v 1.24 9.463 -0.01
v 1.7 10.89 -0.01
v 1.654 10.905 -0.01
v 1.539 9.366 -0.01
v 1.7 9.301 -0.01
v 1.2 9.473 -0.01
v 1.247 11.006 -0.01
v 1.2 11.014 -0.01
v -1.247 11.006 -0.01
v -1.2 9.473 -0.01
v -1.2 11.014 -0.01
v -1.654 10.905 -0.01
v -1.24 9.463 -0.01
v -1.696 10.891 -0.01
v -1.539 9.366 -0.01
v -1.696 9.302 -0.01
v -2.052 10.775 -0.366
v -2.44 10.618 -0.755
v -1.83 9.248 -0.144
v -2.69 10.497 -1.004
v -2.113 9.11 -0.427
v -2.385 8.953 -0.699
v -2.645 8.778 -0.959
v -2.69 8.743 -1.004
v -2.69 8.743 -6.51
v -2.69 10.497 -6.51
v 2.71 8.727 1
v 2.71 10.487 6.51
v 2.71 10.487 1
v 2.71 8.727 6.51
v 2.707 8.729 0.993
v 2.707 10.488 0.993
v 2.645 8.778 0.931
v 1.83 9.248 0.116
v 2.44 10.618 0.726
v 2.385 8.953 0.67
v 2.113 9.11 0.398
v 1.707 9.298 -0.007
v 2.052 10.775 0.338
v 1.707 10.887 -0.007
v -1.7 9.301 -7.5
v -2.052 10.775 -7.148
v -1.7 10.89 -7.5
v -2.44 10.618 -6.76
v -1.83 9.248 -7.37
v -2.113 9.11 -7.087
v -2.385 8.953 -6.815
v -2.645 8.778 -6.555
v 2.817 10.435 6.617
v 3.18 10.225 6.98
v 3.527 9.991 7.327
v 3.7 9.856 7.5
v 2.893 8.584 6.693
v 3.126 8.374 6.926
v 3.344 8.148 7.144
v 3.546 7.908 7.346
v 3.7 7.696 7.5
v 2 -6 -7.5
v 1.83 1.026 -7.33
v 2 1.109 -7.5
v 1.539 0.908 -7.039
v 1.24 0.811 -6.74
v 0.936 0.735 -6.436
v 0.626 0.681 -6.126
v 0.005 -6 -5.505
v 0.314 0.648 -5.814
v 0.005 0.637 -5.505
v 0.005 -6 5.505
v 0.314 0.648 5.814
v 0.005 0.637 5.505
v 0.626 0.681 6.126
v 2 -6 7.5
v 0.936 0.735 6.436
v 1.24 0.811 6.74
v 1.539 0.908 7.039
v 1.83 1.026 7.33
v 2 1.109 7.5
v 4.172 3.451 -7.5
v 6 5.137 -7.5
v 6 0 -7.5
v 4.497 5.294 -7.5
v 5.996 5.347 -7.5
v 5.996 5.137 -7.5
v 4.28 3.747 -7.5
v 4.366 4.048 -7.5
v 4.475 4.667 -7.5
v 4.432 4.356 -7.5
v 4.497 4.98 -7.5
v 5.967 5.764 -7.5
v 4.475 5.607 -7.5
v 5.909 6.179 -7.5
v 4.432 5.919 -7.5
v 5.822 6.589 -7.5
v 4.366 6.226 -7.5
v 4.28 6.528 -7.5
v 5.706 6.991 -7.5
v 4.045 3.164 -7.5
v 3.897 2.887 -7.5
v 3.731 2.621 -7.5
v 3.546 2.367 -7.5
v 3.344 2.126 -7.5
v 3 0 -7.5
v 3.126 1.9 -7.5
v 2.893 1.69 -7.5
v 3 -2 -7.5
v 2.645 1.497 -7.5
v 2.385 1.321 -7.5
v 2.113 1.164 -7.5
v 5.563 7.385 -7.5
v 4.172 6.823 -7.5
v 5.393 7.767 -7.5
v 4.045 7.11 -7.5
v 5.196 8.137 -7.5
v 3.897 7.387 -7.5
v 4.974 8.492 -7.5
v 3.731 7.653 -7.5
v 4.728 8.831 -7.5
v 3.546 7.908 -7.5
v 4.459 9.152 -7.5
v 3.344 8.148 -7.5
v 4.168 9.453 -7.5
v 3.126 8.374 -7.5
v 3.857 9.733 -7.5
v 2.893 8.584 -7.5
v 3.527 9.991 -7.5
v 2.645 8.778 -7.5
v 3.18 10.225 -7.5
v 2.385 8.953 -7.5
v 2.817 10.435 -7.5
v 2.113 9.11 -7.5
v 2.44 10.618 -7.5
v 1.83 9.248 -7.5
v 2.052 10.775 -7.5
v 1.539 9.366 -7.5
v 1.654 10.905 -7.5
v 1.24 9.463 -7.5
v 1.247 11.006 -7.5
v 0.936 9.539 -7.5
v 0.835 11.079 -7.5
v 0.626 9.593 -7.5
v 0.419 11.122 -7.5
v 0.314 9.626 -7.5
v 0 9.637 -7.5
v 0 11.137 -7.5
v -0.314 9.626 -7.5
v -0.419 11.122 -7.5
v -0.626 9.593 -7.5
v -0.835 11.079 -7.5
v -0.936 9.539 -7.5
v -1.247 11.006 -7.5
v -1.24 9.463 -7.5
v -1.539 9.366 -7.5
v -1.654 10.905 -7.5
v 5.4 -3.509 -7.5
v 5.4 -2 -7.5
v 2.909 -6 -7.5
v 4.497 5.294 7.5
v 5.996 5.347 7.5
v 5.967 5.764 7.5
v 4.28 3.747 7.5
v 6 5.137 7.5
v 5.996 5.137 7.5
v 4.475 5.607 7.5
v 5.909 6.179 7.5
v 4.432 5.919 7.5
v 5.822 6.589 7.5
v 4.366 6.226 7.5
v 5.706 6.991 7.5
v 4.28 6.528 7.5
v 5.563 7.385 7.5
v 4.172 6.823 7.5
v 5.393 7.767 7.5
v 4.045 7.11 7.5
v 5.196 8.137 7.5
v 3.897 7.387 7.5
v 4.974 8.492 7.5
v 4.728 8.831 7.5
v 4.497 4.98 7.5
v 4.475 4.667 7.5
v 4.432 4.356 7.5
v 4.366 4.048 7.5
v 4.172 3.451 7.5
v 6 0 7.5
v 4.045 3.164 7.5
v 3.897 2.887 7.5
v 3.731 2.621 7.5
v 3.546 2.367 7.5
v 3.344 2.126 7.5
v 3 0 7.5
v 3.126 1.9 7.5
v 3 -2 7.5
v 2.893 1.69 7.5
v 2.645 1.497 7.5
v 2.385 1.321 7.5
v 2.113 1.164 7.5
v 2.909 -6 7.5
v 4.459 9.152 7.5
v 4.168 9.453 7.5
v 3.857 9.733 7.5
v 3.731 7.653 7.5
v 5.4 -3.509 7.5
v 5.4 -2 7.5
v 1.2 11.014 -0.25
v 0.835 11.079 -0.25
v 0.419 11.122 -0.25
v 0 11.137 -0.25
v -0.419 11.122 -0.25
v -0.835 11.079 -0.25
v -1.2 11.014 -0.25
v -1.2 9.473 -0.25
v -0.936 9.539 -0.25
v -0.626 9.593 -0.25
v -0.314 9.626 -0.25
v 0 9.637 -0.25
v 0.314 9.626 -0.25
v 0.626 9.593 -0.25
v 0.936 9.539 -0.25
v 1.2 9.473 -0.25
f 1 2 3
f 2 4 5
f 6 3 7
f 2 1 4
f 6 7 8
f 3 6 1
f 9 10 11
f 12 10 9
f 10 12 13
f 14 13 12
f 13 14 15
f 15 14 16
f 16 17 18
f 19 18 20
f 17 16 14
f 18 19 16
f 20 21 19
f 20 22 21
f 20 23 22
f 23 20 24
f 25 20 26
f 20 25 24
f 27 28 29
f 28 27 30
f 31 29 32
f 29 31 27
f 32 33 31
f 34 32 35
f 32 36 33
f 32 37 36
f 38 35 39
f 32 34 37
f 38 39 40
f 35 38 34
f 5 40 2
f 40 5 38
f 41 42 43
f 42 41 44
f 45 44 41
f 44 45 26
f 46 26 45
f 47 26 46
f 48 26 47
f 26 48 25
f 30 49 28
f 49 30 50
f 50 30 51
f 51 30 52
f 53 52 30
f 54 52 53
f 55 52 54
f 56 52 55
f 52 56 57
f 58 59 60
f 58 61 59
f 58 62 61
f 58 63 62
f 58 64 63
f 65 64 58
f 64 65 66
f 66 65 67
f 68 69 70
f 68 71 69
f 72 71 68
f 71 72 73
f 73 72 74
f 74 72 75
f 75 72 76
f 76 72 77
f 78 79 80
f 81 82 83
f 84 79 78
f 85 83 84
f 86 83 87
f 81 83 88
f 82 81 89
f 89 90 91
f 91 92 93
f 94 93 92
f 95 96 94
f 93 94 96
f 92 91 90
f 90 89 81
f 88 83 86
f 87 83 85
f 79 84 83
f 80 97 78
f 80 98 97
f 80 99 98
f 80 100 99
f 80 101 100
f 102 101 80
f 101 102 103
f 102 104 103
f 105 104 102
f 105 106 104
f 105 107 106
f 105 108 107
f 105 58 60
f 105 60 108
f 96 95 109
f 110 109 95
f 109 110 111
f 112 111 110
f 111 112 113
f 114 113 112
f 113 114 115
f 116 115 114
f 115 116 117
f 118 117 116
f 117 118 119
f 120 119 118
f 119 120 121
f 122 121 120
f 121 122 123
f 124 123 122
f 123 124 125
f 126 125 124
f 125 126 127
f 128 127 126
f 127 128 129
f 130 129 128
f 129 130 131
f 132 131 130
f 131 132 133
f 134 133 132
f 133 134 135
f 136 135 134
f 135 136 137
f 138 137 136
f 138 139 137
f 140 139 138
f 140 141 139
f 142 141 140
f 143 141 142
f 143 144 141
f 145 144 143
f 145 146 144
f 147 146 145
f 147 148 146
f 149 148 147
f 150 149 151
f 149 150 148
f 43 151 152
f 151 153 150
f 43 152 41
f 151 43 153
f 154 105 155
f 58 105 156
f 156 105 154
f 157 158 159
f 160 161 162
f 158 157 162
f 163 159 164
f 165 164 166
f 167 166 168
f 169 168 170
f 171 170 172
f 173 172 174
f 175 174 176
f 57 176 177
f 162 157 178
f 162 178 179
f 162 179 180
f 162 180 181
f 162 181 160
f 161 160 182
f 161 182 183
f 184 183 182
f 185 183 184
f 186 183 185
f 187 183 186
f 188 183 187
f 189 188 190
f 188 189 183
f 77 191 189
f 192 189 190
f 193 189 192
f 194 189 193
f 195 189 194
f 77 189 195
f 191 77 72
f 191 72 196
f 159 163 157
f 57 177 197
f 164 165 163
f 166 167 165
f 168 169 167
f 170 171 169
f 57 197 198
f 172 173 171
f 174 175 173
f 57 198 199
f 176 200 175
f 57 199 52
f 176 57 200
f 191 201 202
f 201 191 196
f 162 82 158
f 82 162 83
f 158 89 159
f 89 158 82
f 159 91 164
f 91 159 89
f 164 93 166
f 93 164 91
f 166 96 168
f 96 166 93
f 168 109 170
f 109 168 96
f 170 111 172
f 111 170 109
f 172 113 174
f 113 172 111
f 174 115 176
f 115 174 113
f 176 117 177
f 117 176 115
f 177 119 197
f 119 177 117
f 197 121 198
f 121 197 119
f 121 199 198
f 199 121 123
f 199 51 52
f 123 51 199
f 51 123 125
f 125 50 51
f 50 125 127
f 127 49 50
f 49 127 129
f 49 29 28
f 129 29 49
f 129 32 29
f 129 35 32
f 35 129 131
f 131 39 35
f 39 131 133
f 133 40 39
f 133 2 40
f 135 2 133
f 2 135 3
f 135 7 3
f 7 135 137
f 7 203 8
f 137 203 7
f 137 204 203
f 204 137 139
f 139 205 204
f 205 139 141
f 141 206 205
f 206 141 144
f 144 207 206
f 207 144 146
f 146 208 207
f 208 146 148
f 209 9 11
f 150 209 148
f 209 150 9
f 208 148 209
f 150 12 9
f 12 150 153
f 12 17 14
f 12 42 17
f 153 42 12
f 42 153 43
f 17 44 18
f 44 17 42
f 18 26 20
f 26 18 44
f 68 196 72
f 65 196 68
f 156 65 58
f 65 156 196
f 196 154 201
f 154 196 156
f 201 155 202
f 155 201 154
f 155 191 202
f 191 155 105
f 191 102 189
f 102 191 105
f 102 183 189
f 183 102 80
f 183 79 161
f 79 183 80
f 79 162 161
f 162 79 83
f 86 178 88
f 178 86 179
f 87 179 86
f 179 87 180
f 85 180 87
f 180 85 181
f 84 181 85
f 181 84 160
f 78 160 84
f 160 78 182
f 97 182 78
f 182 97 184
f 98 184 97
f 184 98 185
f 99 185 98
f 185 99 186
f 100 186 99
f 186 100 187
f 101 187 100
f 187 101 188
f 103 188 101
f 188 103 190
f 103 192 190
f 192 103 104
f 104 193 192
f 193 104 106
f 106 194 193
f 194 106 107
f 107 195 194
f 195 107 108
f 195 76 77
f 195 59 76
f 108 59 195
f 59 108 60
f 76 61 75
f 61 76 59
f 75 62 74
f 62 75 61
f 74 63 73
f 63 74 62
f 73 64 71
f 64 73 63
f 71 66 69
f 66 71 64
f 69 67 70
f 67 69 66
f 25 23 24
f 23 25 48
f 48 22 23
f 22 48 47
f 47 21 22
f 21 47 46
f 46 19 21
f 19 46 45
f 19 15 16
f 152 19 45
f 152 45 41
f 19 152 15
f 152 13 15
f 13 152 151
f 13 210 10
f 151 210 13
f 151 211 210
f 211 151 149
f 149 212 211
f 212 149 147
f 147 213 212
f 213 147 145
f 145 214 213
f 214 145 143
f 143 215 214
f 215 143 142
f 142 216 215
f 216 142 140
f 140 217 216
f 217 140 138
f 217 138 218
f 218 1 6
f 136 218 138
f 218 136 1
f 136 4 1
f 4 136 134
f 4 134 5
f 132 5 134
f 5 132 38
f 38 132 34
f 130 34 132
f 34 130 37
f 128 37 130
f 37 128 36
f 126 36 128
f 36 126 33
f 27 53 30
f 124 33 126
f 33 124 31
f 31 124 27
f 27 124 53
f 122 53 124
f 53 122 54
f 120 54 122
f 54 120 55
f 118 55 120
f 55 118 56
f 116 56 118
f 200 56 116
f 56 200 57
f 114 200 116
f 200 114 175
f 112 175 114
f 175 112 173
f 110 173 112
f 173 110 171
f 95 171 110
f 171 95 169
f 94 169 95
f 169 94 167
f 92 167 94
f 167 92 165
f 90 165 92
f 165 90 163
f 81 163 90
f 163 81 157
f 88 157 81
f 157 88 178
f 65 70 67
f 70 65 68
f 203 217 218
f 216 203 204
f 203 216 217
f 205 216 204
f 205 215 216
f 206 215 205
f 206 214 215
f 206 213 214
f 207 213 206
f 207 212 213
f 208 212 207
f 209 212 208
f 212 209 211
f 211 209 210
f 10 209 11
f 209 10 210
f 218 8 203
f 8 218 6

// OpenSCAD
// OB-2020 T-Slot Cable Holder
// v1, 26/3/2019
// by inks007
// Modified for 2020 profile by frol, 2019-04-05
// This work is licensed under a Creative Commons Attribution-NonCommercial-ShareAlike 4.0 International License
// (CC BY-NC-SA 4.0)

// Cable holder length
holder_ln = 15;
// Cable holder inner diameter (range = 5-36)
holder_id = 9; // [5:36]
// Cable holder thickness (range = 2-4)
holder_th = 1.5; // [0.5:0.25:4]
// Loosen fit (range = 0-0.3)
loosen = 0.1; // [0:0.05:0.31]

/* [Profile Sizes] */

profile_slot_width=6.2;
profile_slot_depth=6.1;
profile_cage_width=11;
profile_cage_corner_cut=2.55;
profile_wall_thickness=1.9;

/* [Hidden] */

holder_hln = holder_ln/2;
holder_ir = holder_id/2;
holder_od = holder_id+holder_th*2;
holder_or = holder_ir+holder_th;
holder_os = sqrt(pow(holder_ir+holder_th,2)-pow(profile_slot_width/2,2))-holder_ir;
cut_os = 0.6*holder_ir;
cut_points = [[0,0],[0,cut_os-1],[1,cut_os],[holder_hln+0.1,cut_os]];

rotate([-90,90,0]) holder();

module holder() {
	difference() {
		rotate([0,-90,0]) linear_extrude(holder_ln,convexity=3,center=true) difference() {
			union() {
				offset(delta=-loosen) flange_profile();
				intersection() {
					translate([holder_ir+holder_os,0]) circle(d=holder_od,$fn=90);
					translate([holder_id+holder_os,0]) square(holder_od+2,center=true);
				}
				translate([holder_ir/2+holder_os/2,0]) square([holder_ir+holder_os,holder_od],center=true);
			}
			translate([holder_ir+holder_os,0]) circle(d=holder_id,$fn=90);
		}
		// Base cut
		translate([0,0,-10]) linear_extrude(10.1+holder_os+holder_ir,convexity=2) square([holder_ln+2,0.01],center=true);
		// Z cut
		rotate_duplicate([0,0,1]) translate([0,0,holder_os+holder_ir]) linear_extrude(holder_or+1,convexity=2) for (p=[0:1:len(cut_points)-2]) hull() {
			translate(cut_points[p]) circle(r=0.01,$fn=8);
			translate(cut_points[p+1]) circle(r=0.01,$fn=8);
		}
		// Screwdriver slot
		translate([0,0,holder_os+holder_ir+holder_or/2+0.5]) cube([0.5,cut_os*2-3,holder_or+1],center=true);
		// Slide on chamfers
		rotate_duplicate([0,0,1]) translate([holder_hln,cut_os,holder_os+holder_ir]) cylinder(r=1,h=holder_or+1,$fn=4);
		rotate_duplicate([0,0,1]) translate([holder_hln,0,-10]) cylinder(r=2,h=10.1+holder_os+holder_ir,$fn=4);
//		rotate_duplicate([0,0,1]) translate([holder_hln,0,-10]) linear_extrude(10.1+holder_os+holder_ir,convexity=2) polygon([[1,2],[0,2],[-2,0],[-1,0],[0,-1],[1,-1]]);
		// Remove half
		translate([0,(holder_id+holder_th)/2+1,-10]) linear_extrude(10.1+holder_os+holder_ir,convexity=2) square([holder_ln+2,holder_id+holder_th+2],center=true);
		translate([0,0,holder_os+holder_ir]) linear_extrude(holder_or+1,convexity=2) for (p=[0:1:len(cut_points)-2]) hull() {
			translate(cut_points[p]) rotate(90) square(holder_id+holder_th);
			translate(cut_points[p+1]) rotate(90) square(holder_id+holder_th);
		}
		rotate(180) translate([0,0,holder_os+holder_ir]) linear_extrude(holder_or+1,convexity=2) for (p=[0:1:len(cut_points)-2]) hull() {
			translate(cut_points[p]) rotate(-90) square(holder_id+holder_th);
			translate(cut_points[p+1]) rotate(-90) square(holder_id+holder_th);
		}
	}
}

// OB-2020 slot profile
module flange_profile() {
    sw=profile_slot_width/2;
    sd=profile_slot_depth;
    st=profile_wall_thickness;
    cw=profile_cage_width/2;
    cc=profile_cage_corner_cut;
    rotate(-90)
        polygon([
            [-sw,1],
            [-sw,-st],
            [-cw,-st],
            [-cw,-sd+cc],
            [-cw+cc,-sd],
            [cw-cc,-sd],
            [cw,-sd+cc],
            [cw,-st],
            [sw,-st],
            [sw,1]
        ]);
}

module mirror_duplicate(axis) {
	x = axis[0] ? [0,1] : [0];
	y = axis[1] ? [0,1] : [0];
	z = axis[2] ? [0,1] : [0];
	for (a=x) mirror([a,0,0]) for (b=y) mirror([0,b,0]) for (c=z) mirror([0,0,c]) children();
}

module rotate_duplicate(v,n=2) {
	step = 360/n;
	for (a=[0:step:359]) rotate(a=a,v=v) children();
}
